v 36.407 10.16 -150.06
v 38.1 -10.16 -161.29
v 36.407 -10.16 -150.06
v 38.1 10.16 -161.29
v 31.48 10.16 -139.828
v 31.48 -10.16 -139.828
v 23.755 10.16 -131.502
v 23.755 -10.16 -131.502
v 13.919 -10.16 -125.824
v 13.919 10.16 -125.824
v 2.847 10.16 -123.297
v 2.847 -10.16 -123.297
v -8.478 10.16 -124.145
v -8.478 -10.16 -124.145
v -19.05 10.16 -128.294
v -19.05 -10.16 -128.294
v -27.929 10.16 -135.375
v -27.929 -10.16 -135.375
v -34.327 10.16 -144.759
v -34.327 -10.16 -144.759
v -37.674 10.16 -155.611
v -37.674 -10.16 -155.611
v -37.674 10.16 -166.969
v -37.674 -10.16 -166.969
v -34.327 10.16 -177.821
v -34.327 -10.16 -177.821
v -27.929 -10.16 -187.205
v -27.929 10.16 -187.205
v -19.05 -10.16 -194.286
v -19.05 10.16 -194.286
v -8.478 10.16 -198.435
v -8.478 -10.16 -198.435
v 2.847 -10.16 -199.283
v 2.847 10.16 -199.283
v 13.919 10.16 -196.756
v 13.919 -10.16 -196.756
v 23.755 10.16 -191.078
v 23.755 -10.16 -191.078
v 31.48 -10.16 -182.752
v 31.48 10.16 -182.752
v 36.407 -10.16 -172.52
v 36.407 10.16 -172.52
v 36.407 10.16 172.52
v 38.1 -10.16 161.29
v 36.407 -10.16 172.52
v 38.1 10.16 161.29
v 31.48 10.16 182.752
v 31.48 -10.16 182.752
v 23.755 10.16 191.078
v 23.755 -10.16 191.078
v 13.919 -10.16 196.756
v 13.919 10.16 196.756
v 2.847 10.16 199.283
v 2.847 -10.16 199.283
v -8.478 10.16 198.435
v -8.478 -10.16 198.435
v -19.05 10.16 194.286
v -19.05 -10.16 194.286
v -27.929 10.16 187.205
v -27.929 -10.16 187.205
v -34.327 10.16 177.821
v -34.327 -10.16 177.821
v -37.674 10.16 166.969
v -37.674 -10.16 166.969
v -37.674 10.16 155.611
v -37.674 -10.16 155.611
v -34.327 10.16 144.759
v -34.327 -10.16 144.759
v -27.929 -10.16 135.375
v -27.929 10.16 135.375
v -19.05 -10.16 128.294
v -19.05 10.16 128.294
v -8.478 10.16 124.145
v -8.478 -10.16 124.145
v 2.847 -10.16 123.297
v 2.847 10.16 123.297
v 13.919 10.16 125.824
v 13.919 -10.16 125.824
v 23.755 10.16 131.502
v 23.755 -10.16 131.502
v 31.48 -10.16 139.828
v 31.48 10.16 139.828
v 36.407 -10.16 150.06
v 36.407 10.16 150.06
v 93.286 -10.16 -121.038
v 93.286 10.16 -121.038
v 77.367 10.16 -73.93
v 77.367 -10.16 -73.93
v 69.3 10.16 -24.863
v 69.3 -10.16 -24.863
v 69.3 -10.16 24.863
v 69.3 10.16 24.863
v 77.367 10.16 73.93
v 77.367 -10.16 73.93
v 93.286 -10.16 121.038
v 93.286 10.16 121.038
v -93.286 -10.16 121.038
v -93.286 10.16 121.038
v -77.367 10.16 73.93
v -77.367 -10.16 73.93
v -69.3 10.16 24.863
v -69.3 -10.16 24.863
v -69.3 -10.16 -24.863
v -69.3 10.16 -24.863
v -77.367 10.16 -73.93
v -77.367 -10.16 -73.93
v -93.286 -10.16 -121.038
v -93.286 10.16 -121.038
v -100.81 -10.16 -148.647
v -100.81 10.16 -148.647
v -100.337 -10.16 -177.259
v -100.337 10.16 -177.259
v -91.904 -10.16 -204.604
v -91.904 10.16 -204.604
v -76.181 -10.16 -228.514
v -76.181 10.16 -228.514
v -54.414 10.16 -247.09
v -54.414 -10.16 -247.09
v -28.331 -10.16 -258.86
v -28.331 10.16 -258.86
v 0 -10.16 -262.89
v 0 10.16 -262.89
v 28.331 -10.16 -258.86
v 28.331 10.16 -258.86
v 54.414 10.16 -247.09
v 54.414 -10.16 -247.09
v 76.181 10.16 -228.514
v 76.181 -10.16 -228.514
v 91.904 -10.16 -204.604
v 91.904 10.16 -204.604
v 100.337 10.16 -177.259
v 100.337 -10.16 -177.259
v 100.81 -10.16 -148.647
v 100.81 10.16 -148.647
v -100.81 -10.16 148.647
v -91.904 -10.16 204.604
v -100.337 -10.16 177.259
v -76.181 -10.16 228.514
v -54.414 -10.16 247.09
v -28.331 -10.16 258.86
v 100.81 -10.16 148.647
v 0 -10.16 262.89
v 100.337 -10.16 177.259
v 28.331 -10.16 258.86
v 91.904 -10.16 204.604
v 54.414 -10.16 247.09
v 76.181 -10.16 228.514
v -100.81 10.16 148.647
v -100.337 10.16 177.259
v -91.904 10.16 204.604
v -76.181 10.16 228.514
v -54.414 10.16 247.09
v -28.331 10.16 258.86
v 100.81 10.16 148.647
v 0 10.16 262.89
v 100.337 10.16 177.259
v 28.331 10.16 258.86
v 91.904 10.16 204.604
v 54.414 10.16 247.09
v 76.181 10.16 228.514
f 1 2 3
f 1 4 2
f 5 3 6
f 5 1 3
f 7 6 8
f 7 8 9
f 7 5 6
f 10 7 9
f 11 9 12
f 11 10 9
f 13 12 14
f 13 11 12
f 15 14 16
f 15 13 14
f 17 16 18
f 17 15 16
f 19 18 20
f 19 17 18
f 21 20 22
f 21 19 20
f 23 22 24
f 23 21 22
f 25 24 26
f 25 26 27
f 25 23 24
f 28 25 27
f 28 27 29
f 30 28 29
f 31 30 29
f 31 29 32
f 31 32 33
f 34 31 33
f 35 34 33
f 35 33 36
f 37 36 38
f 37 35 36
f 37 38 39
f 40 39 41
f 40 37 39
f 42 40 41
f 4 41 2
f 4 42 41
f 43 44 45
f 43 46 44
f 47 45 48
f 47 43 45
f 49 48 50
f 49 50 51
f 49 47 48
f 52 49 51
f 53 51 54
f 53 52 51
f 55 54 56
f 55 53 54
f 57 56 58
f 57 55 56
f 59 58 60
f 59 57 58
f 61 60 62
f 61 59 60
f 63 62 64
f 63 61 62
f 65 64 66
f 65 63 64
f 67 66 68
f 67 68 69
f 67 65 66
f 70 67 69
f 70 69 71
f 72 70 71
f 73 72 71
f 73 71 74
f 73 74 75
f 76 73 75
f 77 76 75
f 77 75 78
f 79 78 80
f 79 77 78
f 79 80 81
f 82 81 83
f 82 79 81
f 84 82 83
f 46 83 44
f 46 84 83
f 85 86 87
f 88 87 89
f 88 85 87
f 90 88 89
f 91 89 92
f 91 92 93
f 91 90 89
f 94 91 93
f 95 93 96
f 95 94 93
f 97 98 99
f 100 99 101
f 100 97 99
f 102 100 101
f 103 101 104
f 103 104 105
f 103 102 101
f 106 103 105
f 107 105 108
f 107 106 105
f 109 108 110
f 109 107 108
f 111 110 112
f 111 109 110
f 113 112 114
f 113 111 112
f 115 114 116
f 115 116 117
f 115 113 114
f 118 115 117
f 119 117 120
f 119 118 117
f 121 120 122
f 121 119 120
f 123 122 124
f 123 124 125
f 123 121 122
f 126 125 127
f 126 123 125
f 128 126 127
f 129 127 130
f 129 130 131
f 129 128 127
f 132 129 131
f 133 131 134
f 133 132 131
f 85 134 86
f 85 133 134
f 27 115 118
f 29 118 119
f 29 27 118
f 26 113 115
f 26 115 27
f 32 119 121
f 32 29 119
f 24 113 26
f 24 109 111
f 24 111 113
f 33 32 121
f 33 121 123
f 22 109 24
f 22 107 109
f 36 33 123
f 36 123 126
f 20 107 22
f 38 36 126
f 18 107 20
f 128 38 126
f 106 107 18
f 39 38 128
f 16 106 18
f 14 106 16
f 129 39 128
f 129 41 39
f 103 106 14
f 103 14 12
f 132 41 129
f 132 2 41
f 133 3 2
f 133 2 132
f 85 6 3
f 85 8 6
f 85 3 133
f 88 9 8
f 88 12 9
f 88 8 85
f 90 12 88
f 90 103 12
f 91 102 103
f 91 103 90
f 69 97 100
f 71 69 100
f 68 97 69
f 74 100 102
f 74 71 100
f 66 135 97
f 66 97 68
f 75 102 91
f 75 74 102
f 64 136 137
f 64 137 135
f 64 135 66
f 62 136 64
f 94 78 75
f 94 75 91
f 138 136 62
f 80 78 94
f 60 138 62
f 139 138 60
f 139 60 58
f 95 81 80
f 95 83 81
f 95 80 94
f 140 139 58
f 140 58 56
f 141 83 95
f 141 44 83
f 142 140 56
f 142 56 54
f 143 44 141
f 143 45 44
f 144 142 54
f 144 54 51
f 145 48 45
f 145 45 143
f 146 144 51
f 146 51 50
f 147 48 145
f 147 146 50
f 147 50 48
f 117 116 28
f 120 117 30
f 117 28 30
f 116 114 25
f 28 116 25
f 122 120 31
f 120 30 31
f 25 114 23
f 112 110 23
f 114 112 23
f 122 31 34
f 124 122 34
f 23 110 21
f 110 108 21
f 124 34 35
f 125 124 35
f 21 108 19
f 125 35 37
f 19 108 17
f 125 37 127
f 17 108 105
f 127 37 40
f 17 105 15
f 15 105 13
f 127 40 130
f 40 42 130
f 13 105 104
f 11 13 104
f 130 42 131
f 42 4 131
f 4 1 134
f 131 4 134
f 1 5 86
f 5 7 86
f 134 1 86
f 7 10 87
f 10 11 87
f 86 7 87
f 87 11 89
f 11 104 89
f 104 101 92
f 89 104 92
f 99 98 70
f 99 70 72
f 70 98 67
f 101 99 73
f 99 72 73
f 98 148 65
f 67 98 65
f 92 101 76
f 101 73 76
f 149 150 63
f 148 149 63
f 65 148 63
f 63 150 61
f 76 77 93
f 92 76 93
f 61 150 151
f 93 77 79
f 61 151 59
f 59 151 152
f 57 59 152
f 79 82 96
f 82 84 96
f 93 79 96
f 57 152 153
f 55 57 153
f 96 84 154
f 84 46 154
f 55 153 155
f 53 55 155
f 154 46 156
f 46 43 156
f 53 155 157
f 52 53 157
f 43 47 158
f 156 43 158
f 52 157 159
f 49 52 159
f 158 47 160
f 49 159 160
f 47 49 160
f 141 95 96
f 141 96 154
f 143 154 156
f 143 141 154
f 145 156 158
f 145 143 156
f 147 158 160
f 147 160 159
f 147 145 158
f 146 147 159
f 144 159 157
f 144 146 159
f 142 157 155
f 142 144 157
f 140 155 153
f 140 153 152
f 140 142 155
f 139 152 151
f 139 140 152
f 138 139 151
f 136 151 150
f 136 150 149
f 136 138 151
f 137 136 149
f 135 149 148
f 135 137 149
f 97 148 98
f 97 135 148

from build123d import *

# Parameters (mm, degrees)
F0_R     = 38.1
F1_DEPTH = 10.16


with BuildPart() as f1:
    # F0 (on Front) → F1 (new body, symmetric)
    with BuildSketch(Plane.XZ):
        with BuildLine():
            ThreePointArc((93.28624, -121.037828), (68.286859, 0), (93.28624, 121.037828))
            ThreePointArc((93.28624, 121.037828), (0, 262.89), (-93.28624, 121.037828))
            ThreePointArc((-93.28624, 121.037828), (-68.286859, 0), (-93.28624, -121.037828))
            ThreePointArc((-93.28624, -121.037828), (0, -262.89), (93.28624, -121.037828))
        make_face()
        with Locations((0, -161.29)):
            Circle(F0_R, mode=Mode.SUBTRACT)
        with Locations((0, 161.29)):
            Circle(F0_R, mode=Mode.SUBTRACT)
    extrude(amount=F1_DEPTH, both=True)


solid = f1.part
